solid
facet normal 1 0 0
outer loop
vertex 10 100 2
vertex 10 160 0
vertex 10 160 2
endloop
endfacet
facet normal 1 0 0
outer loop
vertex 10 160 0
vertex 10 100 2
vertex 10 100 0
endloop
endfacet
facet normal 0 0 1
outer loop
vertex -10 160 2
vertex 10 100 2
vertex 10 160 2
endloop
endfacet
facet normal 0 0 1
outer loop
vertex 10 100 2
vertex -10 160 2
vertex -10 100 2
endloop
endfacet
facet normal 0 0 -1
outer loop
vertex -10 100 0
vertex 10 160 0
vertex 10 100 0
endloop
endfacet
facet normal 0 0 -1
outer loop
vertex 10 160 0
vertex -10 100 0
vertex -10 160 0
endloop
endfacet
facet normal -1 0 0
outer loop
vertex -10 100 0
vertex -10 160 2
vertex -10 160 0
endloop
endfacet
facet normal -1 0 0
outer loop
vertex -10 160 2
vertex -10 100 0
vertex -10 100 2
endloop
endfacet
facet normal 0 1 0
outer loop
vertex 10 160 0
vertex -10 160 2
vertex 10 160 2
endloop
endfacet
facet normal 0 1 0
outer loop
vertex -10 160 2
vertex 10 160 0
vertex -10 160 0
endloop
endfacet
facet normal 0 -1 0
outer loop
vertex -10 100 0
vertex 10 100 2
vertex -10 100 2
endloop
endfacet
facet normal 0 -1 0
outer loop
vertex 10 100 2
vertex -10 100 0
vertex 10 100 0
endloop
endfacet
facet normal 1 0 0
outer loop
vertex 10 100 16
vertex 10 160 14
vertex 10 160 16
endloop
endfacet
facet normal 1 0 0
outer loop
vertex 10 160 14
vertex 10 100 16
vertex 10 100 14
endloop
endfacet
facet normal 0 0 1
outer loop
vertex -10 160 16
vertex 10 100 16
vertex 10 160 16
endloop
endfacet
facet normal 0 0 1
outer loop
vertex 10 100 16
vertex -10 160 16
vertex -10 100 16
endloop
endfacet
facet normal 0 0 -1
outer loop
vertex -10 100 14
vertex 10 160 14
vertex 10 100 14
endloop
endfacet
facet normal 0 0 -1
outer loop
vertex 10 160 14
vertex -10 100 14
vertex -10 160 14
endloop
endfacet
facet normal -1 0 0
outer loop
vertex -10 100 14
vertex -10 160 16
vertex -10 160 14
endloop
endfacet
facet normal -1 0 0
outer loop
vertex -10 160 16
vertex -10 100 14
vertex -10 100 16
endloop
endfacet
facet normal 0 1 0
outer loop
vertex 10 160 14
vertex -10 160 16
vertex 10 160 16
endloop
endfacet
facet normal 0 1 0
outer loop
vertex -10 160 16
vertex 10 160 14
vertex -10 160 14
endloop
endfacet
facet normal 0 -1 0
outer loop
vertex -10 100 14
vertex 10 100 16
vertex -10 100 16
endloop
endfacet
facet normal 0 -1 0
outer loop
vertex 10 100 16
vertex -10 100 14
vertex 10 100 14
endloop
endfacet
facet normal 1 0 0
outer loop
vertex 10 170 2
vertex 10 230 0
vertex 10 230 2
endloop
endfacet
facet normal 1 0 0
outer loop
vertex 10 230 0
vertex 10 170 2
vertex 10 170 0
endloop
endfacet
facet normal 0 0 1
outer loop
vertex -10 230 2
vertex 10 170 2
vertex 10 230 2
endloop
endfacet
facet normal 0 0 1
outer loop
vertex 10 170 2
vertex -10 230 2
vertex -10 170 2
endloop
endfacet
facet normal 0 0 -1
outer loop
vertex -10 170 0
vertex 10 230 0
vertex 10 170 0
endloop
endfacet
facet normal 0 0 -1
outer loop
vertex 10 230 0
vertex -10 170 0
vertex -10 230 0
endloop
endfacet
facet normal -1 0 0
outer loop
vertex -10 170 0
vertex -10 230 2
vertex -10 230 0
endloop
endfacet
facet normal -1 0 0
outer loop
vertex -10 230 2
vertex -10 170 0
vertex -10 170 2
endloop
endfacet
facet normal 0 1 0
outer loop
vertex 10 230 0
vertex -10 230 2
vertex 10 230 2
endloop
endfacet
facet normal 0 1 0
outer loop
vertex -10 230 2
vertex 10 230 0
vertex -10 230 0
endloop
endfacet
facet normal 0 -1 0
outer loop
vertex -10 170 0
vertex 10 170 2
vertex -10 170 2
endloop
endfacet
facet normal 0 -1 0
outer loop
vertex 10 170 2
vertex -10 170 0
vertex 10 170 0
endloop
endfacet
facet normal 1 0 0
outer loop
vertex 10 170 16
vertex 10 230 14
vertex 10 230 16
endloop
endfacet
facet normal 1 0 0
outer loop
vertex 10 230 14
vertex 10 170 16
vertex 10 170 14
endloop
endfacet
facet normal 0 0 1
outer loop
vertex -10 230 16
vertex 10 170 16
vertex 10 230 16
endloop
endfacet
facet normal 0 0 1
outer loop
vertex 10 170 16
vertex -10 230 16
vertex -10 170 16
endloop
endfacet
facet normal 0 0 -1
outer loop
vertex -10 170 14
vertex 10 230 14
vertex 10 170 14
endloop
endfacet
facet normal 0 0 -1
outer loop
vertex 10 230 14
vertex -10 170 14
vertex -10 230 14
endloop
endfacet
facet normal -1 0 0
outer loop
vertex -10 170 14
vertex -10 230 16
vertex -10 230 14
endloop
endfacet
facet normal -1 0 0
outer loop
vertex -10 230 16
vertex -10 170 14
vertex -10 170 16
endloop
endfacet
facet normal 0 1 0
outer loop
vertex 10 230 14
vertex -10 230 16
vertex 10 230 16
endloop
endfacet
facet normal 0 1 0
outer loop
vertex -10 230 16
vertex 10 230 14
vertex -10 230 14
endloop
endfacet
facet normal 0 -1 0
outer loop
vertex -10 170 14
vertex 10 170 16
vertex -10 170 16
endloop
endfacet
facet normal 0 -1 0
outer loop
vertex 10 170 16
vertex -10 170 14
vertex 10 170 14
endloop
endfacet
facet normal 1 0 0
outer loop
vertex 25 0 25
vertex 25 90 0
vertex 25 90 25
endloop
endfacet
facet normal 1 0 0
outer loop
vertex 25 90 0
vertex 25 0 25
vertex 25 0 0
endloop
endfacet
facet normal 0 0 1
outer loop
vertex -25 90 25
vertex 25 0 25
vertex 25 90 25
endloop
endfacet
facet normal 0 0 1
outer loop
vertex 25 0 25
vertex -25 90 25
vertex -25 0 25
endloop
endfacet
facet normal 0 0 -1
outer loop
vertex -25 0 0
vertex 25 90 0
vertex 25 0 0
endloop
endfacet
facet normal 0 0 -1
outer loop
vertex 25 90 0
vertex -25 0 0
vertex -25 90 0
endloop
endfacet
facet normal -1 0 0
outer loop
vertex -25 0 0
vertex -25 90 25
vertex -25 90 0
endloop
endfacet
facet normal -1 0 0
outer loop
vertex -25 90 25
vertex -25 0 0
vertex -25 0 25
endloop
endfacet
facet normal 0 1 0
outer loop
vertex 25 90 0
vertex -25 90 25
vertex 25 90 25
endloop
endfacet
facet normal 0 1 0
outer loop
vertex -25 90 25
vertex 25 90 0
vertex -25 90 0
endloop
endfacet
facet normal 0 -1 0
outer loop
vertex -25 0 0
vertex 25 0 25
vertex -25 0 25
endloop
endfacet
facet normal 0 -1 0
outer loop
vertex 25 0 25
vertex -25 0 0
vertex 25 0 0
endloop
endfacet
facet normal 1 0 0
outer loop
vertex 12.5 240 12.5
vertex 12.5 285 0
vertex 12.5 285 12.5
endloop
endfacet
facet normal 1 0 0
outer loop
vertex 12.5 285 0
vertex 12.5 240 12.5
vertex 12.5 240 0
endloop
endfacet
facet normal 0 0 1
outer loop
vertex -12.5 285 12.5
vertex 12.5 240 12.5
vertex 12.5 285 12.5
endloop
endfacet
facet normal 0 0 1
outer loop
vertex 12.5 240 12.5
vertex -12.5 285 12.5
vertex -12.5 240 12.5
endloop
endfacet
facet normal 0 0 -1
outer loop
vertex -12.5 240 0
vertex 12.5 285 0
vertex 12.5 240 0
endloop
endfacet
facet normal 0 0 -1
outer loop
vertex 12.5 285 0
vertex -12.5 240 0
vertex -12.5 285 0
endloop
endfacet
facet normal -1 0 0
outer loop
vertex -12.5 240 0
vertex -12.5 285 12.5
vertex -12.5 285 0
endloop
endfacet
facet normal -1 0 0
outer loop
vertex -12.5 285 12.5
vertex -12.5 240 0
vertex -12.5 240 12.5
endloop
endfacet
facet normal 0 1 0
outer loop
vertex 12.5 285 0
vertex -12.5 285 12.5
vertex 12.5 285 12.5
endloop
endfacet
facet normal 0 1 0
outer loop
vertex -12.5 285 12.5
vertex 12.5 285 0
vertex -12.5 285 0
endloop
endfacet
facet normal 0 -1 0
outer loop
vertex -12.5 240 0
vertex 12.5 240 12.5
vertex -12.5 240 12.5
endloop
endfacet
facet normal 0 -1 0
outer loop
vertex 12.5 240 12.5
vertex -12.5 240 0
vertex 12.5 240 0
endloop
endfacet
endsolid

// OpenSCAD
dragon();

module dragon(width = 50, length = 300, wingspan = 300) {
    
    spacing = 10;
    
    
    // Body
    bodyLength = length * 0.3;        
    translate([-width/2,0,0]) {
        body(width, bodyLength);
    } 

    // Neck
    neckWidth = width * 0.4;
    neckLength = length * 0.4;
    neckSegments = 2;
    translate([-neckWidth/2, bodyLength + spacing, 0]) {
        neck(neckWidth, neckLength, neckSegments, spacing);
    }

    // Head
    headWidth = width * 0.5;
    headLength = length * 0.15;
    translate([-headWidth/2, bodyLength + spacing + neckLength + spacing*neckSegments, 0]) {
        head(headWidth, headLength);
    }
}



module body(width, length) {
    
    height = width * 0.5;

    cube([width,length,height]);
    
    
}

module neck(width, length, neckSegments, spacing) {
    segmentLength = length / neckSegments;
    for (segment = [1 : neckSegments]) {
        translate([0, (segment - 1) * (segmentLength+spacing), 0]) {
            neckSegment(width, segmentLength);
        }
    }
}

module neckSegment(width, length) {
    height = width * 0.8;
    
    boneH = width * 0.1;
    
    neckBone(width, length, boneH);
    
    translate([0,0,height - boneH]) {
        neckBone(width, length, boneH);
    }
}

module neckBone(w, l, h) {
    cube([w, l, h]);
}


module head(headWidth, headLength) {
    headHeight = headWidth * 0.5;
    cube([headWidth,headLength,headHeight]);
}
